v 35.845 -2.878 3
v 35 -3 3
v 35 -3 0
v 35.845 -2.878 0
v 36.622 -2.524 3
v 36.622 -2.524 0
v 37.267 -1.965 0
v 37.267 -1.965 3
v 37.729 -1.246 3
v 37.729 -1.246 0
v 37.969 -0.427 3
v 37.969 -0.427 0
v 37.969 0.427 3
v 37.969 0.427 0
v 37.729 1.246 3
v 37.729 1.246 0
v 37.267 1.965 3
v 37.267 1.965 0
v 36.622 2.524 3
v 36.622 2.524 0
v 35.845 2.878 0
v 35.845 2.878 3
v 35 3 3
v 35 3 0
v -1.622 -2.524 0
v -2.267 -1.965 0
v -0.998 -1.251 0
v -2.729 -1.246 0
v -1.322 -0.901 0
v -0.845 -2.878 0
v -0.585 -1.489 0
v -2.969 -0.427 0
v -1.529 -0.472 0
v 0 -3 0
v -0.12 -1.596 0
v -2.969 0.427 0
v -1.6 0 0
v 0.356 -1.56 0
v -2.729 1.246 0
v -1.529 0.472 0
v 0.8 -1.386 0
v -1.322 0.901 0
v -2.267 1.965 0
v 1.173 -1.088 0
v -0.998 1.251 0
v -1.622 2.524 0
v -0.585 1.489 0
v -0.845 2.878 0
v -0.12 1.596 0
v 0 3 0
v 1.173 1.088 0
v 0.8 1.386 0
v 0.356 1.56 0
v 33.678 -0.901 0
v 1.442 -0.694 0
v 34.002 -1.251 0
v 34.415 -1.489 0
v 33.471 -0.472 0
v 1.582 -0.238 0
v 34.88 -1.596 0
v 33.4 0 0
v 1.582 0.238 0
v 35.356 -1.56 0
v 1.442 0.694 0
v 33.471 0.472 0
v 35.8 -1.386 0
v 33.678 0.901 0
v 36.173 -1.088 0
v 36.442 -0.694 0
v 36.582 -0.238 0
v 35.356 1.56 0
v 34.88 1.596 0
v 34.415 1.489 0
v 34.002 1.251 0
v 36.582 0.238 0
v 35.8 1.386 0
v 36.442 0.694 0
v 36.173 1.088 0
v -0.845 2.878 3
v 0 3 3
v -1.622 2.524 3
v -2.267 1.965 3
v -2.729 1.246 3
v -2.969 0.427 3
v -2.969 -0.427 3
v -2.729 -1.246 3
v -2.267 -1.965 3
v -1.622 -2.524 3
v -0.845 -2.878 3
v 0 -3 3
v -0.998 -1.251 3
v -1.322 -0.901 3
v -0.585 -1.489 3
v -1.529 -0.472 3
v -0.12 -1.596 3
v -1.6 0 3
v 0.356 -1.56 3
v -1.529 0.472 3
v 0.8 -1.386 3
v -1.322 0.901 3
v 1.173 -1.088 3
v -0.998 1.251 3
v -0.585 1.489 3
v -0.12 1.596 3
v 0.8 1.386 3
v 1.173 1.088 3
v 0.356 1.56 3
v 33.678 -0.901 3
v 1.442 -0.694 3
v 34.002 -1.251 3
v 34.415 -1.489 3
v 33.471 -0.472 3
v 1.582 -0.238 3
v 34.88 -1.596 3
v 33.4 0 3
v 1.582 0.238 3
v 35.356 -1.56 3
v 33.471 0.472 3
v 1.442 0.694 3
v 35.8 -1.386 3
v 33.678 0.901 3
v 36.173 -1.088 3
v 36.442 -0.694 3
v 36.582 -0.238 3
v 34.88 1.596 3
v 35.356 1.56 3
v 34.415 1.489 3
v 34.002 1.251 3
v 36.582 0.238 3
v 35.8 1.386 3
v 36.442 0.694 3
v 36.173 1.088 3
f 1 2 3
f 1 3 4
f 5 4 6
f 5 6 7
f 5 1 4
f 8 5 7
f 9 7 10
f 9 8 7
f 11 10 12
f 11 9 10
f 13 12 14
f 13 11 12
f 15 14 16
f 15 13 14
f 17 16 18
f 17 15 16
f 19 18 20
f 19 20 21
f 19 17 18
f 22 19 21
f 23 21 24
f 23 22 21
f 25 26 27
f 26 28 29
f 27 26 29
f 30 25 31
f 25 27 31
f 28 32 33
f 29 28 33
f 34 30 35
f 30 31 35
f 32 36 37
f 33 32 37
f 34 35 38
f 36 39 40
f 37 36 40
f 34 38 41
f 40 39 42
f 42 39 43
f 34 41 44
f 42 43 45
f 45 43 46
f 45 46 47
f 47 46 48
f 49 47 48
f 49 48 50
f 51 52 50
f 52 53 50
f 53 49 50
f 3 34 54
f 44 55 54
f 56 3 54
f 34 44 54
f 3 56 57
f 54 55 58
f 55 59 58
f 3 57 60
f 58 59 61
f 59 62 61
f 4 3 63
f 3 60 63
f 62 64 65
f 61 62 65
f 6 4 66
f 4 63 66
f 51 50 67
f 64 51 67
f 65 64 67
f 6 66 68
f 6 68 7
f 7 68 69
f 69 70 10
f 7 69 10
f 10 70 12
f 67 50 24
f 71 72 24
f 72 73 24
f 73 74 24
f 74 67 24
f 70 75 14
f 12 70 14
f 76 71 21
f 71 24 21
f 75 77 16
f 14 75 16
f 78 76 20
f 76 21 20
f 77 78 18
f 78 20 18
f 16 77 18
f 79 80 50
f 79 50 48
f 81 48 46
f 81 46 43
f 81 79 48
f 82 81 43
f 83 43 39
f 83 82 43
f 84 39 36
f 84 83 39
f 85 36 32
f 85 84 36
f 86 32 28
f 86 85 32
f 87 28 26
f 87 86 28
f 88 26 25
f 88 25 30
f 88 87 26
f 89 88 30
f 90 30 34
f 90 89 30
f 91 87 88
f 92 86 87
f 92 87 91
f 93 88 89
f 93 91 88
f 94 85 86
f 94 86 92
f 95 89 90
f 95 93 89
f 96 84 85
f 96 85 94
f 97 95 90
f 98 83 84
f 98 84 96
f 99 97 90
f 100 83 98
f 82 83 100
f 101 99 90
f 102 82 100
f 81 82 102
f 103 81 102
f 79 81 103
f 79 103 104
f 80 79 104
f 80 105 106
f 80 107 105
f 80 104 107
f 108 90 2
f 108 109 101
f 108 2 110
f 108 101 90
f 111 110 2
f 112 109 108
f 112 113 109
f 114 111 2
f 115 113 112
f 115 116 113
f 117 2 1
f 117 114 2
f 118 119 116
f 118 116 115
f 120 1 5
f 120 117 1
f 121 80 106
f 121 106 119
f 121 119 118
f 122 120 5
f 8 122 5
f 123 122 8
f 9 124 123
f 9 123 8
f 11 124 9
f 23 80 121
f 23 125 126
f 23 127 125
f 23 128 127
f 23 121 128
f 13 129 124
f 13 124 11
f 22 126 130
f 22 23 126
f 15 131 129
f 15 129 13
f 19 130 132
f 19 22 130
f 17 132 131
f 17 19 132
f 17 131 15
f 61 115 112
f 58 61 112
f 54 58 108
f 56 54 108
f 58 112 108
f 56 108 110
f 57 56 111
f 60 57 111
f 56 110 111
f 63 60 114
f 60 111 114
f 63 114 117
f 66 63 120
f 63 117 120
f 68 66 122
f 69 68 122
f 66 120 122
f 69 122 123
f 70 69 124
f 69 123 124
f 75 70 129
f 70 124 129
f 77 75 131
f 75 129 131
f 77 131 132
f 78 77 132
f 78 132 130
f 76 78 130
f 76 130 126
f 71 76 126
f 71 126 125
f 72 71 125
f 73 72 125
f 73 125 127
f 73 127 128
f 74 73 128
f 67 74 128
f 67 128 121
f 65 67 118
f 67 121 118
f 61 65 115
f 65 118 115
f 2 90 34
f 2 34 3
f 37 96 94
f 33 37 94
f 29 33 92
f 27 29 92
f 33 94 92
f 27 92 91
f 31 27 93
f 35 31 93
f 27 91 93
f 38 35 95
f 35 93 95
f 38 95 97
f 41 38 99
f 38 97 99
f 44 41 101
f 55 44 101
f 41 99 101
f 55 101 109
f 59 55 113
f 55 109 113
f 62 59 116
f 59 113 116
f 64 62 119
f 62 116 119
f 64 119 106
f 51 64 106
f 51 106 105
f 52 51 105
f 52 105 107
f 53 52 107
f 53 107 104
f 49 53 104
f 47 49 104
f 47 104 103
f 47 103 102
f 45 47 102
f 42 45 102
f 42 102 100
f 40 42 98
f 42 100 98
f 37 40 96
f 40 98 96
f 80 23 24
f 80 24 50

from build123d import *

# Parameters (mm, degrees)
ESQUISSE1_R        = 1.6
BOSS_EXTRU_1_DEPTH = 3


with BuildPart() as part:
    # Esquisse1 → Boss.-Extru.1 (new body)
    with BuildSketch(Plane.XY.offset(3)):
        with BuildLine():
            Line((35, 3), (0, 3))
            ThreePointArc((0, 3), (-3, 0), (0, -3))
            Line((0, -3), (35, -3))
            ThreePointArc((35, -3), (38, 0), (35, 3))
        make_face()
        with Locations(Location((35, 0, 0), (0, 0, 180))):
            Circle(ESQUISSE1_R, mode=Mode.SUBTRACT)
        with Locations(Location((0, 0, 0), (0, 0, 180))):
            Circle(ESQUISSE1_R, mode=Mode.SUBTRACT)
    extrude(amount=-BOSS_EXTRU_1_DEPTH)


solid = part.part
